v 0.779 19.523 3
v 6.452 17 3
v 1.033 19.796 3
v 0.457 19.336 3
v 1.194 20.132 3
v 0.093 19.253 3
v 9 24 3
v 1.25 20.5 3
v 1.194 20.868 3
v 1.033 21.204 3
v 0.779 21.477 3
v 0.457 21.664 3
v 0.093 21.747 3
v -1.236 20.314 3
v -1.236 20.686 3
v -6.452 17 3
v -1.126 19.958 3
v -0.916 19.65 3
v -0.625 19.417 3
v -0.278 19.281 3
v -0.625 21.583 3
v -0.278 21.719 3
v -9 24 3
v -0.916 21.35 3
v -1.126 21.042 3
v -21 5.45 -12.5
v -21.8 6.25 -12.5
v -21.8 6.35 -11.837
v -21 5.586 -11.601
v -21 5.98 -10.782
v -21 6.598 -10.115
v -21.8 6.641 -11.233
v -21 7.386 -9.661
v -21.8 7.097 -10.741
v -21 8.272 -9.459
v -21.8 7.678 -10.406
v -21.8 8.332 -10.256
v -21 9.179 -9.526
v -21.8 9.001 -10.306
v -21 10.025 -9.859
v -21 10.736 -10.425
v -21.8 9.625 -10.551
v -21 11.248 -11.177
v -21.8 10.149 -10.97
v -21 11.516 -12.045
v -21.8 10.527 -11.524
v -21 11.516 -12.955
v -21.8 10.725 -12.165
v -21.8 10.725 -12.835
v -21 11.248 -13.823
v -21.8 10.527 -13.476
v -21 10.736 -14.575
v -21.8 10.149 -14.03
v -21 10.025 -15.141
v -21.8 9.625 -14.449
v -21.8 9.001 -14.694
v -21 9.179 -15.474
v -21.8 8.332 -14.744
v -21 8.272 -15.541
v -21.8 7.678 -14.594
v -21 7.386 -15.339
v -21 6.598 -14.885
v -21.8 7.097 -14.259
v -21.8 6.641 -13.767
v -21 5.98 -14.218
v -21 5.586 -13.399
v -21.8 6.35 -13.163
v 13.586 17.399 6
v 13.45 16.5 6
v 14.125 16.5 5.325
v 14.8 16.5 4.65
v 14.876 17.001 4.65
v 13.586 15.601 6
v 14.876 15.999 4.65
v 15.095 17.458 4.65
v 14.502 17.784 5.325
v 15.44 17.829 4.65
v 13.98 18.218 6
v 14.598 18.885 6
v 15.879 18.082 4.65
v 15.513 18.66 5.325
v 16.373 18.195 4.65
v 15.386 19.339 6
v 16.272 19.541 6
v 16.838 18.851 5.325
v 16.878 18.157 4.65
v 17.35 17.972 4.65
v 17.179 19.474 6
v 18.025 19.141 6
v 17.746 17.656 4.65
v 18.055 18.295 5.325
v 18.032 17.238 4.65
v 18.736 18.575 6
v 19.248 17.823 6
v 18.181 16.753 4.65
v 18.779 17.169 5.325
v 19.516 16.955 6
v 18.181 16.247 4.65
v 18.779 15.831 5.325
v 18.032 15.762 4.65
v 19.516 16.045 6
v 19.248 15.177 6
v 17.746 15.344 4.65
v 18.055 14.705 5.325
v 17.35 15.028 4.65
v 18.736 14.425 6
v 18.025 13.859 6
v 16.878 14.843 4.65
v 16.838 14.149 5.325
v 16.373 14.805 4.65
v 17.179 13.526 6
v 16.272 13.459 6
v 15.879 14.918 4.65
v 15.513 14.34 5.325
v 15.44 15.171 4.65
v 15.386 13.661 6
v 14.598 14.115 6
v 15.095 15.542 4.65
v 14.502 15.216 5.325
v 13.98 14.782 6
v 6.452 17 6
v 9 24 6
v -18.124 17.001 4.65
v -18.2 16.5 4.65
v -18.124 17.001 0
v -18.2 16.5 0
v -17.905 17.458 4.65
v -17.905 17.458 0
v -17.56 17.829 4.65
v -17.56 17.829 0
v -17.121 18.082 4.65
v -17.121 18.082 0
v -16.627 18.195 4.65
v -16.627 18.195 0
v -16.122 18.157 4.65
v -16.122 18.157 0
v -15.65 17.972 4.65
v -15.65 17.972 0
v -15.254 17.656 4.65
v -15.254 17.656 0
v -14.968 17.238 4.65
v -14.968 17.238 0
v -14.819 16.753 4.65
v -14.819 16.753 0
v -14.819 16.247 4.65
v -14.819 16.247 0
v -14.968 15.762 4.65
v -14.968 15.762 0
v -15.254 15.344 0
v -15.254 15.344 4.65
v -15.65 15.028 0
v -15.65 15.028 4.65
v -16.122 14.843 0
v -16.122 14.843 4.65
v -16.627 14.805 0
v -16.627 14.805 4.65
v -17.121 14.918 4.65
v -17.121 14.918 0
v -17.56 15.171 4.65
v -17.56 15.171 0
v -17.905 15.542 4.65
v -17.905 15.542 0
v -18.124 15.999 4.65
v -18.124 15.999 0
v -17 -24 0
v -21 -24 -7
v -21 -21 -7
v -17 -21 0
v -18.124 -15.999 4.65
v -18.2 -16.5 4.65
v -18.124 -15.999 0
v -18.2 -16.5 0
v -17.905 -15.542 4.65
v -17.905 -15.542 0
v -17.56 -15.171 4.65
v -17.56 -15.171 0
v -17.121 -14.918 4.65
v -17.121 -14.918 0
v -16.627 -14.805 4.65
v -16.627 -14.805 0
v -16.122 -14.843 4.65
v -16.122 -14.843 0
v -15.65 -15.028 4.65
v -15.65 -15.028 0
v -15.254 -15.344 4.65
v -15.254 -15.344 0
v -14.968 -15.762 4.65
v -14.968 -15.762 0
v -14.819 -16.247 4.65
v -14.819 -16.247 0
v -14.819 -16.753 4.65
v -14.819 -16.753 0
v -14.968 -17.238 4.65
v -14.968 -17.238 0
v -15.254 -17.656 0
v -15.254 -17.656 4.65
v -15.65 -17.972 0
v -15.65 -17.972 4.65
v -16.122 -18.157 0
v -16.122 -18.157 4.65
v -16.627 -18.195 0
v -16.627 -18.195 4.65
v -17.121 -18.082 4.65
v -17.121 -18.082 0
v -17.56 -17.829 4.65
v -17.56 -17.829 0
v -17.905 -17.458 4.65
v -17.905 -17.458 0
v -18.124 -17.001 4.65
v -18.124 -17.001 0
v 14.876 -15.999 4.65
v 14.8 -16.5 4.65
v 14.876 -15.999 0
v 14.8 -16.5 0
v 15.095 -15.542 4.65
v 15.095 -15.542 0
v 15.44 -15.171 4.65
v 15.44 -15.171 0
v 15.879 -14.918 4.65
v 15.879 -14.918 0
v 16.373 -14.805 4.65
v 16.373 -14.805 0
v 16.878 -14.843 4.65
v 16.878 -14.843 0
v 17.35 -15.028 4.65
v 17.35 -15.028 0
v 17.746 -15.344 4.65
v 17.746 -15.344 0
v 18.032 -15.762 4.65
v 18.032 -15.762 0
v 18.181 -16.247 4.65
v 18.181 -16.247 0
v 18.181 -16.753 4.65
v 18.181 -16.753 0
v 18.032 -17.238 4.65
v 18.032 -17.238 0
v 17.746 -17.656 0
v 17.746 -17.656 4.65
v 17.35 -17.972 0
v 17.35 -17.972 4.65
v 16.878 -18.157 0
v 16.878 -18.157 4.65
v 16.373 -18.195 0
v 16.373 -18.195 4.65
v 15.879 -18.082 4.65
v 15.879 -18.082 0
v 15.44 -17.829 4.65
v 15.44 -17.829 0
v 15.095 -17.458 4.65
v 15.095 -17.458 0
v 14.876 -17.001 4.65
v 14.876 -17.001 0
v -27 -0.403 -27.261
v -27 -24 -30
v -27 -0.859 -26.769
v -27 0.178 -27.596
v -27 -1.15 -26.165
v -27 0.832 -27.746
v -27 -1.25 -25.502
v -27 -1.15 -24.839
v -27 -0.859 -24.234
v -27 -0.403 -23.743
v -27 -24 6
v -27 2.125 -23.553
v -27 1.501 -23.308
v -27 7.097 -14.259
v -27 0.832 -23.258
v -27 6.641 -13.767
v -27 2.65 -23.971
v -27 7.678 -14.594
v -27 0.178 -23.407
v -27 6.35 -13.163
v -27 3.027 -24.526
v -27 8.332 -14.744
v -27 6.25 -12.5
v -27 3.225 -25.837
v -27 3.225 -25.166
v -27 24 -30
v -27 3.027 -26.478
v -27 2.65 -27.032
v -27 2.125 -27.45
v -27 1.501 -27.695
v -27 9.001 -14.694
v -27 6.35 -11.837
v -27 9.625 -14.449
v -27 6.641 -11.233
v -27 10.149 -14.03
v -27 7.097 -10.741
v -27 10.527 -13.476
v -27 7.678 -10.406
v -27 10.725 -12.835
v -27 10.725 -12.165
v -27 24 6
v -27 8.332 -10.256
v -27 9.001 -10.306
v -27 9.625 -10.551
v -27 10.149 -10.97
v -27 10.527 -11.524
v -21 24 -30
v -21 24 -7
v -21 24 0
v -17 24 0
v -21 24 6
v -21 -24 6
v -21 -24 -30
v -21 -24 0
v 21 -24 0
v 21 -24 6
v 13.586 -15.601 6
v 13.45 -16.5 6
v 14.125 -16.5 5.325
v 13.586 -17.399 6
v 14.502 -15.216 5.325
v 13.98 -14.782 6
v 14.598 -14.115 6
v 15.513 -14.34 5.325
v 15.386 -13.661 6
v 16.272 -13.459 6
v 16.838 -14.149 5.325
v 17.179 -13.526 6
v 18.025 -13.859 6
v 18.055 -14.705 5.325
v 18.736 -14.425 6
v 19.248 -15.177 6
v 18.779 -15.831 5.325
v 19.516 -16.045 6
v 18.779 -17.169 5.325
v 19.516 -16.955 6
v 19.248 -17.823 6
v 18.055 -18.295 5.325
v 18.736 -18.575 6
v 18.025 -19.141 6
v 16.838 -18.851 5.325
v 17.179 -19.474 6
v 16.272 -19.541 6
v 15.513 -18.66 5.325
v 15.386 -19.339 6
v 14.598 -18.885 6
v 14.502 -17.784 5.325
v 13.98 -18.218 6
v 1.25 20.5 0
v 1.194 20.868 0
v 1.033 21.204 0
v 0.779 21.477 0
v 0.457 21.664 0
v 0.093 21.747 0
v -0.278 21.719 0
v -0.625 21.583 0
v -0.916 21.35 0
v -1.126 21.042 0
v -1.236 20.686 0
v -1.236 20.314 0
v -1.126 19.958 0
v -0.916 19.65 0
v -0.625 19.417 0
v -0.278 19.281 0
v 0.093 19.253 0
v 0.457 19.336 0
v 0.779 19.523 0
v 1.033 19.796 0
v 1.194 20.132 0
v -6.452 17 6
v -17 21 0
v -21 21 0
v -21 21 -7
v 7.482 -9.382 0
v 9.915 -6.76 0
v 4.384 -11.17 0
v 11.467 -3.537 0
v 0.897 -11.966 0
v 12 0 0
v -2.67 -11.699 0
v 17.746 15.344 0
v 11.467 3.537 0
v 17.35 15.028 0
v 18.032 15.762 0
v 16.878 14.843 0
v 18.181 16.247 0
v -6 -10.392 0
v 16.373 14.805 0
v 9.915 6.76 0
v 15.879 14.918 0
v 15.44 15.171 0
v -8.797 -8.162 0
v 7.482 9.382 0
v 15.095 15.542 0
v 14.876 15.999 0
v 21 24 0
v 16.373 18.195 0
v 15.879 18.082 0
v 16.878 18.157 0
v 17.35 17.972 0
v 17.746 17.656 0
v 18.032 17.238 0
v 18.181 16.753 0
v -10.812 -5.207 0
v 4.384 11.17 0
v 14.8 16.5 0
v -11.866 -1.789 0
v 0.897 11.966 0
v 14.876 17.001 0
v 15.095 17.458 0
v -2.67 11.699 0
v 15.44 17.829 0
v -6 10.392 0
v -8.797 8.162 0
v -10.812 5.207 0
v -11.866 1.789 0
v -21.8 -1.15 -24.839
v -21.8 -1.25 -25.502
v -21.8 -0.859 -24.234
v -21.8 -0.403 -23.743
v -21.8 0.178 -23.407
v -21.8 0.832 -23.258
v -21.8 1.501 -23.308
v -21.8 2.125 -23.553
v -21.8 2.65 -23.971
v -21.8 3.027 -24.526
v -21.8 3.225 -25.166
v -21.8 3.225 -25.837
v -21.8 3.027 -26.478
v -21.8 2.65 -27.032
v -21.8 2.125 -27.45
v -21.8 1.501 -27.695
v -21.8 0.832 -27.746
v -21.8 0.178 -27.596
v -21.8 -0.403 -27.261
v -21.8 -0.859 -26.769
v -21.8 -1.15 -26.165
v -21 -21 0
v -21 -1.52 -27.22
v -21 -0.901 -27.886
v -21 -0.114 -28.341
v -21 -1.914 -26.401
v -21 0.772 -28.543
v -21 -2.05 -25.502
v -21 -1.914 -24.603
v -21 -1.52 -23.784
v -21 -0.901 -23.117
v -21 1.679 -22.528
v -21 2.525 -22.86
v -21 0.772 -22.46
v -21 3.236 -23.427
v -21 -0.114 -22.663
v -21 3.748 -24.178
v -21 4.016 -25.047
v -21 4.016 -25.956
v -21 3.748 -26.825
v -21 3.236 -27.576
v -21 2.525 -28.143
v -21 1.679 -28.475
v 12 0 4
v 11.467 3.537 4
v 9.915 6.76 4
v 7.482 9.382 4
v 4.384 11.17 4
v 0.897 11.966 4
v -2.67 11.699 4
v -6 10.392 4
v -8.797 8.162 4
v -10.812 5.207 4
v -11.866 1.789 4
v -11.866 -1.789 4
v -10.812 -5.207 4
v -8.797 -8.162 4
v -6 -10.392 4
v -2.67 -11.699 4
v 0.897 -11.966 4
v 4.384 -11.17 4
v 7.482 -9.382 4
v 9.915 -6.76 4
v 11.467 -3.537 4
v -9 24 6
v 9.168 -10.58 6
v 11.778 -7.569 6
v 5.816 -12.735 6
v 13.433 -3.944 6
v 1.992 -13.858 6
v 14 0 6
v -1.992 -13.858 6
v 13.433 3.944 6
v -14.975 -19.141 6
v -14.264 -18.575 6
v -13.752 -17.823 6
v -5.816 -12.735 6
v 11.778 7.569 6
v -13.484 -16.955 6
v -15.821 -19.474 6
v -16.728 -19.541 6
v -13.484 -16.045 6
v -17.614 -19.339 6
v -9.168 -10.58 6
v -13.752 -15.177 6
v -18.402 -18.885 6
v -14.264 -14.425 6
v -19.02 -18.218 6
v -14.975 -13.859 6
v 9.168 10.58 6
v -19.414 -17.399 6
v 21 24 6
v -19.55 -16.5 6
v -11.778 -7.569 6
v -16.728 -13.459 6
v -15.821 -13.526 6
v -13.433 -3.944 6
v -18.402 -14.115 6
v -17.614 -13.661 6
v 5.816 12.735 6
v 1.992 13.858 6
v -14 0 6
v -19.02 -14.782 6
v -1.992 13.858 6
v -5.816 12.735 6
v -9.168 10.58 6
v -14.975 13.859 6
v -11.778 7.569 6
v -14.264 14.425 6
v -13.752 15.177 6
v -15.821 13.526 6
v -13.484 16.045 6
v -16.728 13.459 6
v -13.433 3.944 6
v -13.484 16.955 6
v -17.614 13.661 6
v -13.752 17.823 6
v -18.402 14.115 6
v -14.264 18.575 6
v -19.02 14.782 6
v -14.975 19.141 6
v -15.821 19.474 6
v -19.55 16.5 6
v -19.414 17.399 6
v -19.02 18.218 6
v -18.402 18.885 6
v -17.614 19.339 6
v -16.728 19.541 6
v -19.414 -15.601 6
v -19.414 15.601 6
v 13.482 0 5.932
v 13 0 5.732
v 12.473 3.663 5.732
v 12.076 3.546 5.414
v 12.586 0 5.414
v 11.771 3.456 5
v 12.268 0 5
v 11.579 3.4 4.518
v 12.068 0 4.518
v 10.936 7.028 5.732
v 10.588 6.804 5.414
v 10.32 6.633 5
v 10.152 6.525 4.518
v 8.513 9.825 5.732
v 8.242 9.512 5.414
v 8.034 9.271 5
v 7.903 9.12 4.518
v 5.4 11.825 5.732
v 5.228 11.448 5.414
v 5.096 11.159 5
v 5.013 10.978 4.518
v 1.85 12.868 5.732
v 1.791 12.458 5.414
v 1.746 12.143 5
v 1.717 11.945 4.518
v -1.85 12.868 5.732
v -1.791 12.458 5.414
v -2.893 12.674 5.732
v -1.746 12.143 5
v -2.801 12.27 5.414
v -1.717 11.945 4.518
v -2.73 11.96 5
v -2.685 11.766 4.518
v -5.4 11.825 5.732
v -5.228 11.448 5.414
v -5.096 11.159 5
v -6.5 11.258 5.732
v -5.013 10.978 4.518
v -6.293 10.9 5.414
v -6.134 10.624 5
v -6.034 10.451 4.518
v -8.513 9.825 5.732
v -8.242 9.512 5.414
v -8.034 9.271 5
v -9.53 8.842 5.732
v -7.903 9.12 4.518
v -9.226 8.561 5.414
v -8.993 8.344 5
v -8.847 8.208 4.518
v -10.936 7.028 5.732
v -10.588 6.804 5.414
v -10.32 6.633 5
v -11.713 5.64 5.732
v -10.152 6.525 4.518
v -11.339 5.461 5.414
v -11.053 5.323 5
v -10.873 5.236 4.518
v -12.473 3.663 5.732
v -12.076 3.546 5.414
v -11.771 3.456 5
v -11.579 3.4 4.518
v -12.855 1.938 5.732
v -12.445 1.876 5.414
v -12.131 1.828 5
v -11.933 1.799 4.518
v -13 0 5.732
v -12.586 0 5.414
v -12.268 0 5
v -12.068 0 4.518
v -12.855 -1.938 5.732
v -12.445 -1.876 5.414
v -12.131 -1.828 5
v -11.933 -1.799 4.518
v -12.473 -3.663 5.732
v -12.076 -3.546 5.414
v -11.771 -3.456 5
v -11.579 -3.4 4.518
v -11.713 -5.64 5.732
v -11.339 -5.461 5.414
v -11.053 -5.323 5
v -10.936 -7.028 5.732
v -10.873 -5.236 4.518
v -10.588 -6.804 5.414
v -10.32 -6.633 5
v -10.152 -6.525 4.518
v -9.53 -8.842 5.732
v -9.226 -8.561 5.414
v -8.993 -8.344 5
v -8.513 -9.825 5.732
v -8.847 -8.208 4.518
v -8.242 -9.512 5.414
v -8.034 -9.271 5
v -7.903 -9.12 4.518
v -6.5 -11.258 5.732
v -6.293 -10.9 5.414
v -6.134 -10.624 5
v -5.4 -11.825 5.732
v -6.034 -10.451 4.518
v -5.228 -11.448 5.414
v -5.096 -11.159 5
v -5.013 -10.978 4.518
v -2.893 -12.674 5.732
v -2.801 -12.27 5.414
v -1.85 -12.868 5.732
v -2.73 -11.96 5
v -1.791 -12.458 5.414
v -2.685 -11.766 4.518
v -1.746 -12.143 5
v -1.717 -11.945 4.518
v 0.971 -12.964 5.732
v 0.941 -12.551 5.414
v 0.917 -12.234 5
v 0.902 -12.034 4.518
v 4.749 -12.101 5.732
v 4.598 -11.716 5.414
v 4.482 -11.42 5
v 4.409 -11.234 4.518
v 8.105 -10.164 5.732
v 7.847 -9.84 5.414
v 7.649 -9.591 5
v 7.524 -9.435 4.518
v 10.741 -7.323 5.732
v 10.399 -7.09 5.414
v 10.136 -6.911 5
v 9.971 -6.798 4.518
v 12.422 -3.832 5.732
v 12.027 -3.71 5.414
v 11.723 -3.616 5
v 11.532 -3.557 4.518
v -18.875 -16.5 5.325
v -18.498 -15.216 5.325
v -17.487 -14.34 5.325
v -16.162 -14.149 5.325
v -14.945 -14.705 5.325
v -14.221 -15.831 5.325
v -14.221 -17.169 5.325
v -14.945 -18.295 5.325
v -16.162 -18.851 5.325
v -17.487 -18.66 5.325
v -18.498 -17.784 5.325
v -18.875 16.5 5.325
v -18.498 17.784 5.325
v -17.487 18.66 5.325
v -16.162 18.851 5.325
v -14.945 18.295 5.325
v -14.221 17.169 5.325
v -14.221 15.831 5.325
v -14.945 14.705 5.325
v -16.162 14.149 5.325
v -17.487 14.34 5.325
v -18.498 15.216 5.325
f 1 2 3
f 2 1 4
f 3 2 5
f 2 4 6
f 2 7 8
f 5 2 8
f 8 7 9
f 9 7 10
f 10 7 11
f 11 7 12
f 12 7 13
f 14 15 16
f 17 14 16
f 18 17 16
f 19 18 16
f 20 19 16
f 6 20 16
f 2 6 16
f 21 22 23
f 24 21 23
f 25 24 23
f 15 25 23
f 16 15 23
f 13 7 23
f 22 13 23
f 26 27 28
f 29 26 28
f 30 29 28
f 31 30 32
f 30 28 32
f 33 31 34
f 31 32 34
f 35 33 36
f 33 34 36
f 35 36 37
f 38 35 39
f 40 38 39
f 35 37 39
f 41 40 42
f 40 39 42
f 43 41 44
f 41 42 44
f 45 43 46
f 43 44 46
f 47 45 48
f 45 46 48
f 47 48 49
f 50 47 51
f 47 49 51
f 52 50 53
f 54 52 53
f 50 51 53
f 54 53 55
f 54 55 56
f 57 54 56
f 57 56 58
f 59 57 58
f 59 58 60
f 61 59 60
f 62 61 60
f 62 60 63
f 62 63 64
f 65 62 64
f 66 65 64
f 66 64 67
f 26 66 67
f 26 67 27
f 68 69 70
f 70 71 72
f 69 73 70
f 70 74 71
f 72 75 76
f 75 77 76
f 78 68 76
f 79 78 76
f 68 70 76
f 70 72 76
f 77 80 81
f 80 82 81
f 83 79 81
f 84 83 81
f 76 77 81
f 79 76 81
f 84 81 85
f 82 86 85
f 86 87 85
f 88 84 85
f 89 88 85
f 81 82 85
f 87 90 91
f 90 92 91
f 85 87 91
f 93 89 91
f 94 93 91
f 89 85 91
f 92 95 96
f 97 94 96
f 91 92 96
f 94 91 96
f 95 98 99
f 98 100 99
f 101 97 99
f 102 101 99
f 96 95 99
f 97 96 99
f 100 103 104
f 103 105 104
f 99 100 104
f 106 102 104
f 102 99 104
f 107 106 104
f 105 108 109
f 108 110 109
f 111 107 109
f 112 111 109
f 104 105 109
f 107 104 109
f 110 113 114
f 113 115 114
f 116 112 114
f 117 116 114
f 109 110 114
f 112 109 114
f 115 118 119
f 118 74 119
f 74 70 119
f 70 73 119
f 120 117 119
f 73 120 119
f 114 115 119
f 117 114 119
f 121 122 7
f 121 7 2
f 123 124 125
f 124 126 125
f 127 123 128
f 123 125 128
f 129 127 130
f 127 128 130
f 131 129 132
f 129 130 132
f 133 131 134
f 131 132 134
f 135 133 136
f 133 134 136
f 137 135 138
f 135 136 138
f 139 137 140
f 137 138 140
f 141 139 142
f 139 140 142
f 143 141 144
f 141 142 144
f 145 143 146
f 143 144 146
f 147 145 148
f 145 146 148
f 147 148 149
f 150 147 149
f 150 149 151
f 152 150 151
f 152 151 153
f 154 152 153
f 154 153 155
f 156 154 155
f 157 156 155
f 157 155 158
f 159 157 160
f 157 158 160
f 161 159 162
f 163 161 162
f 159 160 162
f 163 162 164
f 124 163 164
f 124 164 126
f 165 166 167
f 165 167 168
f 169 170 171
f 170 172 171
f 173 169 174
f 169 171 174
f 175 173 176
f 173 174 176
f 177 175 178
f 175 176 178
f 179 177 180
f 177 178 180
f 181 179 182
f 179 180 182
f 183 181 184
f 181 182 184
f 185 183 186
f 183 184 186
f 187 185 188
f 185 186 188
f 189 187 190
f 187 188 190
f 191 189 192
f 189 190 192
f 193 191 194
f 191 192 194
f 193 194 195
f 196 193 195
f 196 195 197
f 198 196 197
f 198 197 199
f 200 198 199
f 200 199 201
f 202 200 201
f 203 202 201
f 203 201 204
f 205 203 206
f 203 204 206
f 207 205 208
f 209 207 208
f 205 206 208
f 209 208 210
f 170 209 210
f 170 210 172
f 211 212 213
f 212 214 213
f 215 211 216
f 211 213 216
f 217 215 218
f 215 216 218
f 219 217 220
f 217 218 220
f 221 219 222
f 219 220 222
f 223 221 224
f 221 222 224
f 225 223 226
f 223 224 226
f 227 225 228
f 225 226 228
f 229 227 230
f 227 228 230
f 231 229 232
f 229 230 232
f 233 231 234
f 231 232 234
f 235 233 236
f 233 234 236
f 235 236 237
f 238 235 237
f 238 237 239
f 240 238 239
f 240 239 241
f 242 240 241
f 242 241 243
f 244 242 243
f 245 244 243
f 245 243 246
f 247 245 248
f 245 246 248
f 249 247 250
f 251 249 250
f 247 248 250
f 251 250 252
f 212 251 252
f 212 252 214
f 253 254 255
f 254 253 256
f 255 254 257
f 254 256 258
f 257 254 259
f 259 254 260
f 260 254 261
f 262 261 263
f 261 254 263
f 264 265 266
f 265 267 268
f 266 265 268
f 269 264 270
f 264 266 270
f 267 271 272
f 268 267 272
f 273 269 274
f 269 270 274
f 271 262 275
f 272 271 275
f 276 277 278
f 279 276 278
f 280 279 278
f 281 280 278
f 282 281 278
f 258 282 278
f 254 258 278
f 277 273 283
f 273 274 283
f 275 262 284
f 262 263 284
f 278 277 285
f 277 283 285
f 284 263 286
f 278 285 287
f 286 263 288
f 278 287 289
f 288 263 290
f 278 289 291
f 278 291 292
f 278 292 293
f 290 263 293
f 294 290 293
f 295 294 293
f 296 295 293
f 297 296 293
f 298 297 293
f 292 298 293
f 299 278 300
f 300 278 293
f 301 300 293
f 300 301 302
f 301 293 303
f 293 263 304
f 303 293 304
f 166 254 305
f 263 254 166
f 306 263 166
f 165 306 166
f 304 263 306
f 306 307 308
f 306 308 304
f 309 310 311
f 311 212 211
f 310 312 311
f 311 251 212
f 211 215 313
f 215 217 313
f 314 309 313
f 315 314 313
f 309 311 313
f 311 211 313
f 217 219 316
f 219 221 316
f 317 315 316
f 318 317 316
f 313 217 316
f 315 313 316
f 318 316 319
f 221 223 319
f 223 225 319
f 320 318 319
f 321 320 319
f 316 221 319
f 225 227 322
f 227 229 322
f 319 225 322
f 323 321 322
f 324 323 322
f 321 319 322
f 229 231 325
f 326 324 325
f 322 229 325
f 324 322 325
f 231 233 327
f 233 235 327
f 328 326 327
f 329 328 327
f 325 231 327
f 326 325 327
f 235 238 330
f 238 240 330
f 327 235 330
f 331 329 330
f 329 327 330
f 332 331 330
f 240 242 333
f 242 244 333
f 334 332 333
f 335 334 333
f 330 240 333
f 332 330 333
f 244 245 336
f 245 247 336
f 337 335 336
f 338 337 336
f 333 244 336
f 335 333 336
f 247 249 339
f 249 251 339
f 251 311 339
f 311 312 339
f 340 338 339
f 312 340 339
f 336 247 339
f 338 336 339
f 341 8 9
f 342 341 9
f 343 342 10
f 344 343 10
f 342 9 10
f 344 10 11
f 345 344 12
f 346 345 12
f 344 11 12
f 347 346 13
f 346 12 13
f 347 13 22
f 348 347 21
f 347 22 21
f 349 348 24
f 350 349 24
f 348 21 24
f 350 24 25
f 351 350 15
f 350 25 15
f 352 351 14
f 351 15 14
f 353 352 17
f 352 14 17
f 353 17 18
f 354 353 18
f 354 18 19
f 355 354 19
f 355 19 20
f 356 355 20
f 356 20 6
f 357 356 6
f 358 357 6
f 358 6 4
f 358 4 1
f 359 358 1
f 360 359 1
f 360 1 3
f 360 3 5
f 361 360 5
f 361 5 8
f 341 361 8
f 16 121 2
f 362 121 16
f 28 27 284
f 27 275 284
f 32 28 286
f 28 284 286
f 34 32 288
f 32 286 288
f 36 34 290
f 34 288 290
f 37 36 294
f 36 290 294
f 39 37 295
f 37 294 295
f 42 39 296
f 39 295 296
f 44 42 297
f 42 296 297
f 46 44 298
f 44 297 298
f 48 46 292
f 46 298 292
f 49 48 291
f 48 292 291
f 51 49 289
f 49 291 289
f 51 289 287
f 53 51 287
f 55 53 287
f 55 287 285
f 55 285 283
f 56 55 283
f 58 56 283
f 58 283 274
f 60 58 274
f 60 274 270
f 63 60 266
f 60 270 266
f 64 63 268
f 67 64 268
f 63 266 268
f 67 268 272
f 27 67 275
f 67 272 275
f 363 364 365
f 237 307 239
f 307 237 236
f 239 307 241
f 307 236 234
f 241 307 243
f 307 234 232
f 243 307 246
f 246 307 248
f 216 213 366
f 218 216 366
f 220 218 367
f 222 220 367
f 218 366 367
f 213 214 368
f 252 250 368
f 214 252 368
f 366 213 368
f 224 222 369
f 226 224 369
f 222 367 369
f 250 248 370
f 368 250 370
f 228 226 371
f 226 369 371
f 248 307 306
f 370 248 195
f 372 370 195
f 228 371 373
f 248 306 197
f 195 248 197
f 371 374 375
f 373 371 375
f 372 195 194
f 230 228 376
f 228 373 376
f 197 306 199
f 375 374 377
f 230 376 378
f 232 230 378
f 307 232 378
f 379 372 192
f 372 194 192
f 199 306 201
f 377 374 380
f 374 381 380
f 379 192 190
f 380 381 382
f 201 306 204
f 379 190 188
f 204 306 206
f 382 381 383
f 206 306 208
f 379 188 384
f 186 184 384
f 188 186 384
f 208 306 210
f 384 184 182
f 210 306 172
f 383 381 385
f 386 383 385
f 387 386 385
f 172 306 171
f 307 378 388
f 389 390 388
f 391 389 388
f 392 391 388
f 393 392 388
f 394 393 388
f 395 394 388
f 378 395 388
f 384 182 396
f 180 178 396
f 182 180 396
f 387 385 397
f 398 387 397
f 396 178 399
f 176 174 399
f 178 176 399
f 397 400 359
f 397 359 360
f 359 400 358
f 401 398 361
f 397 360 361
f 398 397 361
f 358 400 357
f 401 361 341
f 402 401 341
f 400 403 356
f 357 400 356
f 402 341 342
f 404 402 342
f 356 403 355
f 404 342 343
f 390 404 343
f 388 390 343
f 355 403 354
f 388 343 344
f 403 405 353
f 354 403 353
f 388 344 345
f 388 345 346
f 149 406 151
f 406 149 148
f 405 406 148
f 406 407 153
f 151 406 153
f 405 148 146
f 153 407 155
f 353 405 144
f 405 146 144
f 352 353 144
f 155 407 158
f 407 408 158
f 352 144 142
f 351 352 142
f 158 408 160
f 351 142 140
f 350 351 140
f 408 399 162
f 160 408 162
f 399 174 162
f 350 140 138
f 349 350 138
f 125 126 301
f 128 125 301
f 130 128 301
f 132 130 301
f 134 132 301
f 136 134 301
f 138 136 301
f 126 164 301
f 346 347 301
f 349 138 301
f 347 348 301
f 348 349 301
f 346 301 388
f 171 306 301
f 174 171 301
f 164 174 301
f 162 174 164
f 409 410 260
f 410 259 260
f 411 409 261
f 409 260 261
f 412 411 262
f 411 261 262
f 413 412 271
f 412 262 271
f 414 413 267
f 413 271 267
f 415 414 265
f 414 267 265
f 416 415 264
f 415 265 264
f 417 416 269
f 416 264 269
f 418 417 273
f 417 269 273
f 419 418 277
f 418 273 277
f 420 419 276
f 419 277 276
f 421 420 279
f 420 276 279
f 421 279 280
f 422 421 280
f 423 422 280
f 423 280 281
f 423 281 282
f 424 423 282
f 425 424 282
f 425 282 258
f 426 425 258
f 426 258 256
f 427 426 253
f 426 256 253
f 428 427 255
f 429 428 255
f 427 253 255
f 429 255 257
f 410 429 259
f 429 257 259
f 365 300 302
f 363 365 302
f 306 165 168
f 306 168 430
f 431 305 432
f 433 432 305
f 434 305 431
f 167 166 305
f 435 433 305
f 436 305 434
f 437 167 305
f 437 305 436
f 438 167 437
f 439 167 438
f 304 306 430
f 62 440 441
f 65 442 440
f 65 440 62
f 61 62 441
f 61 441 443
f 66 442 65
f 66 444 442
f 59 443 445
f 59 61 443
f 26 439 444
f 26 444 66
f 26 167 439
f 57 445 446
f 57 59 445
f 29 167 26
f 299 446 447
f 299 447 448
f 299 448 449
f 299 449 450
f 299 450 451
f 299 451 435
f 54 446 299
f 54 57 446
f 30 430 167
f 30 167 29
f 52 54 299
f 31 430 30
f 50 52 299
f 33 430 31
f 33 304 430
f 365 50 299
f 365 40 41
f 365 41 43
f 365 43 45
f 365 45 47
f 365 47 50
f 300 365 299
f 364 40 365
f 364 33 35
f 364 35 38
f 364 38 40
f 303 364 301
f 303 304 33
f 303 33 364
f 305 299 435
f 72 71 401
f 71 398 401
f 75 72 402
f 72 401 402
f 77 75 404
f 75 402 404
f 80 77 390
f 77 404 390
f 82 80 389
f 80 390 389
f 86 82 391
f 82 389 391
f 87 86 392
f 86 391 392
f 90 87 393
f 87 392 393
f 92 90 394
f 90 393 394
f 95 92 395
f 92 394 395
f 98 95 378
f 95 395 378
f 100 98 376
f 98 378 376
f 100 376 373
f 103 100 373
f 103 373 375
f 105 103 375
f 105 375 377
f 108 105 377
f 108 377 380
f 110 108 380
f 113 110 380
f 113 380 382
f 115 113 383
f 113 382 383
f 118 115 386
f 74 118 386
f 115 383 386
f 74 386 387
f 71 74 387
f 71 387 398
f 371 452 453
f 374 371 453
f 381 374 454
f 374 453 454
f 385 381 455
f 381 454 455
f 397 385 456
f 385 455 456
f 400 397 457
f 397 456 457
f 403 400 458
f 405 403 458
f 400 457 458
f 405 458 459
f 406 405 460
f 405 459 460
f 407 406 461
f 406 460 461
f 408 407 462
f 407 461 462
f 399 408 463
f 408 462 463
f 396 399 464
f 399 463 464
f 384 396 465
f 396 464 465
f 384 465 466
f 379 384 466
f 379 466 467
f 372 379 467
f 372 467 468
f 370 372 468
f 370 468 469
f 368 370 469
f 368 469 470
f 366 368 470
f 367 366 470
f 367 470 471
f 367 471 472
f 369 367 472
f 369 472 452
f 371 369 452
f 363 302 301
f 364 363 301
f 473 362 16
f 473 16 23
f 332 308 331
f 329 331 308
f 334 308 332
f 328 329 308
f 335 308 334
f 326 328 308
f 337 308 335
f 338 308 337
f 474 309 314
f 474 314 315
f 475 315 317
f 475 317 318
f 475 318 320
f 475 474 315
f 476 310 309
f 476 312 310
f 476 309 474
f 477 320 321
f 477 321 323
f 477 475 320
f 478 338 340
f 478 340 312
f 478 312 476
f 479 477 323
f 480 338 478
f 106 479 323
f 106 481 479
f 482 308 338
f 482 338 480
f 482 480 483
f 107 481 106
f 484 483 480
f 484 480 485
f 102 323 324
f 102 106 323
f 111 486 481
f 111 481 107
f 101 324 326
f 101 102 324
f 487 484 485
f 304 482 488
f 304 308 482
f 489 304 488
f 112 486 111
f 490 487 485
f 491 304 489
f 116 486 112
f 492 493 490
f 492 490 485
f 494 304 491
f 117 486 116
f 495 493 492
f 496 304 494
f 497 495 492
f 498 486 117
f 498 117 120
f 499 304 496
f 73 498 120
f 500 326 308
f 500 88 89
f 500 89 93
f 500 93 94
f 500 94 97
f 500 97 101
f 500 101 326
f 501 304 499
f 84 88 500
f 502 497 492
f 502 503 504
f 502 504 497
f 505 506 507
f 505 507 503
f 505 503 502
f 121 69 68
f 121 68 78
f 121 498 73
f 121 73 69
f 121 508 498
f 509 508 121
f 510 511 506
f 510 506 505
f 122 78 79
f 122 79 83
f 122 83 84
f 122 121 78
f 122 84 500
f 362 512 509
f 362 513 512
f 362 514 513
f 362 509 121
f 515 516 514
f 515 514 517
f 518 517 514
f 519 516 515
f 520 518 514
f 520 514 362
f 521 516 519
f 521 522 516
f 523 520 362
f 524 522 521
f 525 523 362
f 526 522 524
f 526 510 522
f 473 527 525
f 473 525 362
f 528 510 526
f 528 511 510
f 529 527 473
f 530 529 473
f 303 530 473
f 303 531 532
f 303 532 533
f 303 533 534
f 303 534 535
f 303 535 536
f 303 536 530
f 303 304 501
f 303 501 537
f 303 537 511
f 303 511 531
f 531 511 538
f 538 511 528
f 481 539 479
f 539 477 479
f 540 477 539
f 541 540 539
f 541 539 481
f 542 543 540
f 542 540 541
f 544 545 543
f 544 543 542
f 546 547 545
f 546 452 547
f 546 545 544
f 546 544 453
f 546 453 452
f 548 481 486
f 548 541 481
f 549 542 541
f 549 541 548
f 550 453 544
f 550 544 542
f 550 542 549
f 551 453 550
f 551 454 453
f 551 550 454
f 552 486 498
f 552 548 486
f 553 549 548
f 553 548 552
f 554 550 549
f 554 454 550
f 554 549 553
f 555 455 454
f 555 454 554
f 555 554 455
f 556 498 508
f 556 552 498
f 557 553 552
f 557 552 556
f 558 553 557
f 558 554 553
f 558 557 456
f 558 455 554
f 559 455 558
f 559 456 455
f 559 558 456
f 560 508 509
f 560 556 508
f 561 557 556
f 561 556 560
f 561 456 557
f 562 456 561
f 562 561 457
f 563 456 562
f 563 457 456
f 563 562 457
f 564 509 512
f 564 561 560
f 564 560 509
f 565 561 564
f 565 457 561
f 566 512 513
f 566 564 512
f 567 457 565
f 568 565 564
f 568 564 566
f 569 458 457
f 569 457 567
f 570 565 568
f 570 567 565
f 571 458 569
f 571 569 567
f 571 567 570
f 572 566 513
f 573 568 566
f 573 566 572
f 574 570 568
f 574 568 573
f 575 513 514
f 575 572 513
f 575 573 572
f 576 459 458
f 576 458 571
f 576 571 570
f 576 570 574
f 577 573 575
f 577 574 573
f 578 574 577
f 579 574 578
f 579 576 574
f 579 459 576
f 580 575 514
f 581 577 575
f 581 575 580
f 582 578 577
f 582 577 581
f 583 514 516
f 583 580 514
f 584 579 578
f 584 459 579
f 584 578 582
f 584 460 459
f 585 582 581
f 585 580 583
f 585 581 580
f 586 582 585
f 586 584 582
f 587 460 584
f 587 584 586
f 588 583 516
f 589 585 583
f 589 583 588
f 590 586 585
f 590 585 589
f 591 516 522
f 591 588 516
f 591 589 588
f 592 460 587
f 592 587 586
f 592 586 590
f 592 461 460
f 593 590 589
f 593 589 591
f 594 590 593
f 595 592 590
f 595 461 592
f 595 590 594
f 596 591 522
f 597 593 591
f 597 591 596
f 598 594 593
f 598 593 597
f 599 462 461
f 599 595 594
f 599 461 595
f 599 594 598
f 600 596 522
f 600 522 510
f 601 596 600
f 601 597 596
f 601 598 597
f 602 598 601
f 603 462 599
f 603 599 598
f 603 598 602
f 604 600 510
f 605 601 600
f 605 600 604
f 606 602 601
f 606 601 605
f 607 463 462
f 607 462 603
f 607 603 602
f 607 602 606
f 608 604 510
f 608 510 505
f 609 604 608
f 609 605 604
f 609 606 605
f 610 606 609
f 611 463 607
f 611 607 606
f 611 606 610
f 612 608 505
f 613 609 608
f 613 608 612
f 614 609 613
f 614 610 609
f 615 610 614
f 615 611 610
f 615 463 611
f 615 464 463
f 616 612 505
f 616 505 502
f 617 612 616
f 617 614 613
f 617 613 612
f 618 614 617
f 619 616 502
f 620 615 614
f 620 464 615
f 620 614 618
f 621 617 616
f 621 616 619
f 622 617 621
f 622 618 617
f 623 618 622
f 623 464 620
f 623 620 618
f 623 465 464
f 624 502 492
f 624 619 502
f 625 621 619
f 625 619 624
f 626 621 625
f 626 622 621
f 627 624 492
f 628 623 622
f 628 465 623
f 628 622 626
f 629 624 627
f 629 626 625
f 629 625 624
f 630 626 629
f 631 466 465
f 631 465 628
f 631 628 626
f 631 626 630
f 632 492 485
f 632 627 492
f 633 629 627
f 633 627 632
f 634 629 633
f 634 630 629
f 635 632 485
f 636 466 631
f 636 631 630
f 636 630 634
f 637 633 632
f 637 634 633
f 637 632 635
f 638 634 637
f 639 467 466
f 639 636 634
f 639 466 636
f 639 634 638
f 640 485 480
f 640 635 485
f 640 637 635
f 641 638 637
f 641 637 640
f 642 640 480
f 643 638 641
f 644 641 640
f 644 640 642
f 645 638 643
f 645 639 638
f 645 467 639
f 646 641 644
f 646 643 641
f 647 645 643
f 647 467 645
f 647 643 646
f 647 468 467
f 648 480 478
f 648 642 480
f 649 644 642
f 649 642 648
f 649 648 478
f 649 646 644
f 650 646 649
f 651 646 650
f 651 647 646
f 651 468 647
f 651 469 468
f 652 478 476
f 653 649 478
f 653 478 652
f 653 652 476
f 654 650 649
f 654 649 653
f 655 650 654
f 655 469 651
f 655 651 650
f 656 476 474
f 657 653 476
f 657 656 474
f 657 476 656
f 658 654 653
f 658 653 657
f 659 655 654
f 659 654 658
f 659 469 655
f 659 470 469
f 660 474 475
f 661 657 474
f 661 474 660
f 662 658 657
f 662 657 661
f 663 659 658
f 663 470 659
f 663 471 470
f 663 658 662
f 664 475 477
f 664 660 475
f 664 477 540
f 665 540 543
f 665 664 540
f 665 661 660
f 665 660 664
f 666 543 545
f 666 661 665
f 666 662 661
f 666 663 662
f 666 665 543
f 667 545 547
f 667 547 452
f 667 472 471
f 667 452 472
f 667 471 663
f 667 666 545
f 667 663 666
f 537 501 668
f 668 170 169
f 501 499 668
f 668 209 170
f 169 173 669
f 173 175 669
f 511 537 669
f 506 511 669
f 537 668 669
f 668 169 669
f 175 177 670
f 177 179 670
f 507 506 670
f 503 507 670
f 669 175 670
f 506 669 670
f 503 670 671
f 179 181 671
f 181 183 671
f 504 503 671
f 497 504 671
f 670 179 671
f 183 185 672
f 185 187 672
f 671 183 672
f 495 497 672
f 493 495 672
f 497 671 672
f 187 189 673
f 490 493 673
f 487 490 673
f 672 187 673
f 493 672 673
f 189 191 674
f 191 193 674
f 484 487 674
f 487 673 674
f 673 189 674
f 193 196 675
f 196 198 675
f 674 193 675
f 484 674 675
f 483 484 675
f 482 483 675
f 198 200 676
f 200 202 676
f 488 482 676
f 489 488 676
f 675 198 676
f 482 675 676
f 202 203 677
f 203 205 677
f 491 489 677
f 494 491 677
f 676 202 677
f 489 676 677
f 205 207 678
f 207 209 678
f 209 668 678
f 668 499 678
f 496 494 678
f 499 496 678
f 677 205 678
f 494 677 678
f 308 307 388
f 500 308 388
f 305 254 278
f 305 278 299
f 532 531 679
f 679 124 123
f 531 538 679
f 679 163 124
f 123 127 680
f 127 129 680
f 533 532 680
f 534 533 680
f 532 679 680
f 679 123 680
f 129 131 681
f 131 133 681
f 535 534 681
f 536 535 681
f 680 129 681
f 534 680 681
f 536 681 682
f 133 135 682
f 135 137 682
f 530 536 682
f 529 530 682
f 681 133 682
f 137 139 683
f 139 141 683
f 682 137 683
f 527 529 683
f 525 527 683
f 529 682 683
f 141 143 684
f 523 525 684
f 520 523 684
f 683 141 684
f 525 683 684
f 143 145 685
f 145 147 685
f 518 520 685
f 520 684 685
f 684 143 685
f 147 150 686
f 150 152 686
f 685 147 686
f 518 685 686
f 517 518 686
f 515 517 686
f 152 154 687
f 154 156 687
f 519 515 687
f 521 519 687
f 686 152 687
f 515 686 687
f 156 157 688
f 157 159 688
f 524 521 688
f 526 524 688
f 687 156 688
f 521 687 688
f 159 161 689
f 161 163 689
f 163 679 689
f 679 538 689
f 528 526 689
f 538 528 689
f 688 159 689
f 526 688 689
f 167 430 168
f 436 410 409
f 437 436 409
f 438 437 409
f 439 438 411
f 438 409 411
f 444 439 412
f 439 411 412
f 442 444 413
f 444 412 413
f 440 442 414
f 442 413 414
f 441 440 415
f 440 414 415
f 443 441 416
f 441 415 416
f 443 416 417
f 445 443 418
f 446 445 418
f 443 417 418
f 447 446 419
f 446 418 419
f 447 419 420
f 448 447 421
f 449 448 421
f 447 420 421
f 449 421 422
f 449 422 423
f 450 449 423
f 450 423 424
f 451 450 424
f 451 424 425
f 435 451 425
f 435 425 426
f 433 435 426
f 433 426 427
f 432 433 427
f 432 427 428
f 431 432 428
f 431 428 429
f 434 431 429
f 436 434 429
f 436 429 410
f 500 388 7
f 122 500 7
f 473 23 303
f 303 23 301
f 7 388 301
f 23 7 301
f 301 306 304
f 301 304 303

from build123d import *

# Parameters (mm, degrees)
BINDER012_W         = 48
BINDER012_H         = 42
PAD006_DEPTH        = 6
HOLE005_D           = 3.4
HOLE005_CSINK_D     = 6.1
HOLE005_CSINK_ANGLE = 90
SKETCH022_R         = 12
POCKET005_DEPTH     = 6.001
FILLET002_R         = 2
POCKET010_DEPTH     = 3
SKETCH037_R         = 1.25
POCKET011_DEPTH     = 3.001
SKETCH020_W         = 6
SKETCH020_H         = 48
PAD007_DEPTH        = 6
PAD007_DEPTH_BACK   = 30
PAD008_DEPTH        = 3
HOLE010_D           = 4.5
HOLE010_DEPTH       = 25
HOLE010_CSINK_D     = 6.1
HOLE010_CSINK_ANGLE = 90


with BuildPart() as body009:
    # Binder012 → Pad006 (new body)
    with BuildSketch(Plane(origin=(0, 0, 0), x_dir=(0, 1, 0), z_dir=(0, 0, 1))):
        Rectangle(BINDER012_W, BINDER012_H)
    extrude(amount=PAD006_DEPTH)

    # Hole005 (through all)
    with Locations(Plane.XY.offset(6)):
        with Locations((-16.5, 16.5), (-16.5, -16.5), (16.5, -16.5), (16.5, 16.5)):
            CounterSinkHole(HOLE005_D / 2, HOLE005_CSINK_D / 2, counter_sink_angle=HOLE005_CSINK_ANGLE)

    # Sketch022 (on Face5 of Hole005) → Pocket005 (cut, through all)
    with BuildSketch(Plane.XY.offset(6)):
        Circle(SKETCH022_R)
    extrude(amount=-POCKET005_DEPTH, mode=Mode.SUBTRACT)

    # Fillet002
    fillet002_edges = [body009.edges().sort_by_distance(p)[0] for p in [
        (-12, 0, 6),
    ]]
    fillet(fillet002_edges, radius=FILLET002_R)

    # Sketch023 (on Face1 of Fillet002) → Pocket010 (cut)
    with BuildSketch(Plane.XY.offset(6)):
        Polygon((-9, 24), (9, 24), (6.452208, 17), (-6.452208, 17), align=None)
    extrude(amount=-POCKET010_DEPTH, mode=Mode.SUBTRACT)

    # Sketch037 (on Face15 of Pocket010) → Pocket011 (cut, through all)
    with BuildSketch(Plane.XY.offset(3)):
        with Locations((0, 20.5)):
            Circle(SKETCH037_R)
    extrude(amount=-POCKET011_DEPTH, mode=Mode.SUBTRACT)


with BuildPart() as body010:
    # Sketch020 (on Face1 of Binder013) → Pad007 (new body, two sides)
    with BuildSketch(Plane.XY) as pad007_sk:
        with Locations((-24, 0)):
            Rectangle(SKETCH020_W, SKETCH020_H)
    extrude(amount=PAD007_DEPTH)
    extrude(pad007_sk.sketch, amount=-PAD007_DEPTH_BACK)

    # Sketch021 (on Face3 of Pad007) → Pad008 (join)
    with BuildSketch(Plane.XZ.offset(24)):
        Polygon((-21, 0), (-21, -7), (-17, 0), align=None)
    pad008 = extrude(amount=-PAD008_DEPTH)

    # Mirrored002: Pad008 across XZ
    add(pad008.mirror(Plane.XZ))

    # Hole010
    with Locations(Plane(origin=(-21, 191, 0), x_dir=(0, 1, 0), z_dir=(1, 0, 0))):
        with Locations((-189.999737, -25.501831), (-182.5, -12.5)):
            CounterSinkHole(HOLE010_D / 2, HOLE010_CSINK_D / 2, depth=HOLE010_DEPTH, counter_sink_angle=HOLE010_CSINK_ANGLE)


solid = Compound([body009.part, body010.part])
